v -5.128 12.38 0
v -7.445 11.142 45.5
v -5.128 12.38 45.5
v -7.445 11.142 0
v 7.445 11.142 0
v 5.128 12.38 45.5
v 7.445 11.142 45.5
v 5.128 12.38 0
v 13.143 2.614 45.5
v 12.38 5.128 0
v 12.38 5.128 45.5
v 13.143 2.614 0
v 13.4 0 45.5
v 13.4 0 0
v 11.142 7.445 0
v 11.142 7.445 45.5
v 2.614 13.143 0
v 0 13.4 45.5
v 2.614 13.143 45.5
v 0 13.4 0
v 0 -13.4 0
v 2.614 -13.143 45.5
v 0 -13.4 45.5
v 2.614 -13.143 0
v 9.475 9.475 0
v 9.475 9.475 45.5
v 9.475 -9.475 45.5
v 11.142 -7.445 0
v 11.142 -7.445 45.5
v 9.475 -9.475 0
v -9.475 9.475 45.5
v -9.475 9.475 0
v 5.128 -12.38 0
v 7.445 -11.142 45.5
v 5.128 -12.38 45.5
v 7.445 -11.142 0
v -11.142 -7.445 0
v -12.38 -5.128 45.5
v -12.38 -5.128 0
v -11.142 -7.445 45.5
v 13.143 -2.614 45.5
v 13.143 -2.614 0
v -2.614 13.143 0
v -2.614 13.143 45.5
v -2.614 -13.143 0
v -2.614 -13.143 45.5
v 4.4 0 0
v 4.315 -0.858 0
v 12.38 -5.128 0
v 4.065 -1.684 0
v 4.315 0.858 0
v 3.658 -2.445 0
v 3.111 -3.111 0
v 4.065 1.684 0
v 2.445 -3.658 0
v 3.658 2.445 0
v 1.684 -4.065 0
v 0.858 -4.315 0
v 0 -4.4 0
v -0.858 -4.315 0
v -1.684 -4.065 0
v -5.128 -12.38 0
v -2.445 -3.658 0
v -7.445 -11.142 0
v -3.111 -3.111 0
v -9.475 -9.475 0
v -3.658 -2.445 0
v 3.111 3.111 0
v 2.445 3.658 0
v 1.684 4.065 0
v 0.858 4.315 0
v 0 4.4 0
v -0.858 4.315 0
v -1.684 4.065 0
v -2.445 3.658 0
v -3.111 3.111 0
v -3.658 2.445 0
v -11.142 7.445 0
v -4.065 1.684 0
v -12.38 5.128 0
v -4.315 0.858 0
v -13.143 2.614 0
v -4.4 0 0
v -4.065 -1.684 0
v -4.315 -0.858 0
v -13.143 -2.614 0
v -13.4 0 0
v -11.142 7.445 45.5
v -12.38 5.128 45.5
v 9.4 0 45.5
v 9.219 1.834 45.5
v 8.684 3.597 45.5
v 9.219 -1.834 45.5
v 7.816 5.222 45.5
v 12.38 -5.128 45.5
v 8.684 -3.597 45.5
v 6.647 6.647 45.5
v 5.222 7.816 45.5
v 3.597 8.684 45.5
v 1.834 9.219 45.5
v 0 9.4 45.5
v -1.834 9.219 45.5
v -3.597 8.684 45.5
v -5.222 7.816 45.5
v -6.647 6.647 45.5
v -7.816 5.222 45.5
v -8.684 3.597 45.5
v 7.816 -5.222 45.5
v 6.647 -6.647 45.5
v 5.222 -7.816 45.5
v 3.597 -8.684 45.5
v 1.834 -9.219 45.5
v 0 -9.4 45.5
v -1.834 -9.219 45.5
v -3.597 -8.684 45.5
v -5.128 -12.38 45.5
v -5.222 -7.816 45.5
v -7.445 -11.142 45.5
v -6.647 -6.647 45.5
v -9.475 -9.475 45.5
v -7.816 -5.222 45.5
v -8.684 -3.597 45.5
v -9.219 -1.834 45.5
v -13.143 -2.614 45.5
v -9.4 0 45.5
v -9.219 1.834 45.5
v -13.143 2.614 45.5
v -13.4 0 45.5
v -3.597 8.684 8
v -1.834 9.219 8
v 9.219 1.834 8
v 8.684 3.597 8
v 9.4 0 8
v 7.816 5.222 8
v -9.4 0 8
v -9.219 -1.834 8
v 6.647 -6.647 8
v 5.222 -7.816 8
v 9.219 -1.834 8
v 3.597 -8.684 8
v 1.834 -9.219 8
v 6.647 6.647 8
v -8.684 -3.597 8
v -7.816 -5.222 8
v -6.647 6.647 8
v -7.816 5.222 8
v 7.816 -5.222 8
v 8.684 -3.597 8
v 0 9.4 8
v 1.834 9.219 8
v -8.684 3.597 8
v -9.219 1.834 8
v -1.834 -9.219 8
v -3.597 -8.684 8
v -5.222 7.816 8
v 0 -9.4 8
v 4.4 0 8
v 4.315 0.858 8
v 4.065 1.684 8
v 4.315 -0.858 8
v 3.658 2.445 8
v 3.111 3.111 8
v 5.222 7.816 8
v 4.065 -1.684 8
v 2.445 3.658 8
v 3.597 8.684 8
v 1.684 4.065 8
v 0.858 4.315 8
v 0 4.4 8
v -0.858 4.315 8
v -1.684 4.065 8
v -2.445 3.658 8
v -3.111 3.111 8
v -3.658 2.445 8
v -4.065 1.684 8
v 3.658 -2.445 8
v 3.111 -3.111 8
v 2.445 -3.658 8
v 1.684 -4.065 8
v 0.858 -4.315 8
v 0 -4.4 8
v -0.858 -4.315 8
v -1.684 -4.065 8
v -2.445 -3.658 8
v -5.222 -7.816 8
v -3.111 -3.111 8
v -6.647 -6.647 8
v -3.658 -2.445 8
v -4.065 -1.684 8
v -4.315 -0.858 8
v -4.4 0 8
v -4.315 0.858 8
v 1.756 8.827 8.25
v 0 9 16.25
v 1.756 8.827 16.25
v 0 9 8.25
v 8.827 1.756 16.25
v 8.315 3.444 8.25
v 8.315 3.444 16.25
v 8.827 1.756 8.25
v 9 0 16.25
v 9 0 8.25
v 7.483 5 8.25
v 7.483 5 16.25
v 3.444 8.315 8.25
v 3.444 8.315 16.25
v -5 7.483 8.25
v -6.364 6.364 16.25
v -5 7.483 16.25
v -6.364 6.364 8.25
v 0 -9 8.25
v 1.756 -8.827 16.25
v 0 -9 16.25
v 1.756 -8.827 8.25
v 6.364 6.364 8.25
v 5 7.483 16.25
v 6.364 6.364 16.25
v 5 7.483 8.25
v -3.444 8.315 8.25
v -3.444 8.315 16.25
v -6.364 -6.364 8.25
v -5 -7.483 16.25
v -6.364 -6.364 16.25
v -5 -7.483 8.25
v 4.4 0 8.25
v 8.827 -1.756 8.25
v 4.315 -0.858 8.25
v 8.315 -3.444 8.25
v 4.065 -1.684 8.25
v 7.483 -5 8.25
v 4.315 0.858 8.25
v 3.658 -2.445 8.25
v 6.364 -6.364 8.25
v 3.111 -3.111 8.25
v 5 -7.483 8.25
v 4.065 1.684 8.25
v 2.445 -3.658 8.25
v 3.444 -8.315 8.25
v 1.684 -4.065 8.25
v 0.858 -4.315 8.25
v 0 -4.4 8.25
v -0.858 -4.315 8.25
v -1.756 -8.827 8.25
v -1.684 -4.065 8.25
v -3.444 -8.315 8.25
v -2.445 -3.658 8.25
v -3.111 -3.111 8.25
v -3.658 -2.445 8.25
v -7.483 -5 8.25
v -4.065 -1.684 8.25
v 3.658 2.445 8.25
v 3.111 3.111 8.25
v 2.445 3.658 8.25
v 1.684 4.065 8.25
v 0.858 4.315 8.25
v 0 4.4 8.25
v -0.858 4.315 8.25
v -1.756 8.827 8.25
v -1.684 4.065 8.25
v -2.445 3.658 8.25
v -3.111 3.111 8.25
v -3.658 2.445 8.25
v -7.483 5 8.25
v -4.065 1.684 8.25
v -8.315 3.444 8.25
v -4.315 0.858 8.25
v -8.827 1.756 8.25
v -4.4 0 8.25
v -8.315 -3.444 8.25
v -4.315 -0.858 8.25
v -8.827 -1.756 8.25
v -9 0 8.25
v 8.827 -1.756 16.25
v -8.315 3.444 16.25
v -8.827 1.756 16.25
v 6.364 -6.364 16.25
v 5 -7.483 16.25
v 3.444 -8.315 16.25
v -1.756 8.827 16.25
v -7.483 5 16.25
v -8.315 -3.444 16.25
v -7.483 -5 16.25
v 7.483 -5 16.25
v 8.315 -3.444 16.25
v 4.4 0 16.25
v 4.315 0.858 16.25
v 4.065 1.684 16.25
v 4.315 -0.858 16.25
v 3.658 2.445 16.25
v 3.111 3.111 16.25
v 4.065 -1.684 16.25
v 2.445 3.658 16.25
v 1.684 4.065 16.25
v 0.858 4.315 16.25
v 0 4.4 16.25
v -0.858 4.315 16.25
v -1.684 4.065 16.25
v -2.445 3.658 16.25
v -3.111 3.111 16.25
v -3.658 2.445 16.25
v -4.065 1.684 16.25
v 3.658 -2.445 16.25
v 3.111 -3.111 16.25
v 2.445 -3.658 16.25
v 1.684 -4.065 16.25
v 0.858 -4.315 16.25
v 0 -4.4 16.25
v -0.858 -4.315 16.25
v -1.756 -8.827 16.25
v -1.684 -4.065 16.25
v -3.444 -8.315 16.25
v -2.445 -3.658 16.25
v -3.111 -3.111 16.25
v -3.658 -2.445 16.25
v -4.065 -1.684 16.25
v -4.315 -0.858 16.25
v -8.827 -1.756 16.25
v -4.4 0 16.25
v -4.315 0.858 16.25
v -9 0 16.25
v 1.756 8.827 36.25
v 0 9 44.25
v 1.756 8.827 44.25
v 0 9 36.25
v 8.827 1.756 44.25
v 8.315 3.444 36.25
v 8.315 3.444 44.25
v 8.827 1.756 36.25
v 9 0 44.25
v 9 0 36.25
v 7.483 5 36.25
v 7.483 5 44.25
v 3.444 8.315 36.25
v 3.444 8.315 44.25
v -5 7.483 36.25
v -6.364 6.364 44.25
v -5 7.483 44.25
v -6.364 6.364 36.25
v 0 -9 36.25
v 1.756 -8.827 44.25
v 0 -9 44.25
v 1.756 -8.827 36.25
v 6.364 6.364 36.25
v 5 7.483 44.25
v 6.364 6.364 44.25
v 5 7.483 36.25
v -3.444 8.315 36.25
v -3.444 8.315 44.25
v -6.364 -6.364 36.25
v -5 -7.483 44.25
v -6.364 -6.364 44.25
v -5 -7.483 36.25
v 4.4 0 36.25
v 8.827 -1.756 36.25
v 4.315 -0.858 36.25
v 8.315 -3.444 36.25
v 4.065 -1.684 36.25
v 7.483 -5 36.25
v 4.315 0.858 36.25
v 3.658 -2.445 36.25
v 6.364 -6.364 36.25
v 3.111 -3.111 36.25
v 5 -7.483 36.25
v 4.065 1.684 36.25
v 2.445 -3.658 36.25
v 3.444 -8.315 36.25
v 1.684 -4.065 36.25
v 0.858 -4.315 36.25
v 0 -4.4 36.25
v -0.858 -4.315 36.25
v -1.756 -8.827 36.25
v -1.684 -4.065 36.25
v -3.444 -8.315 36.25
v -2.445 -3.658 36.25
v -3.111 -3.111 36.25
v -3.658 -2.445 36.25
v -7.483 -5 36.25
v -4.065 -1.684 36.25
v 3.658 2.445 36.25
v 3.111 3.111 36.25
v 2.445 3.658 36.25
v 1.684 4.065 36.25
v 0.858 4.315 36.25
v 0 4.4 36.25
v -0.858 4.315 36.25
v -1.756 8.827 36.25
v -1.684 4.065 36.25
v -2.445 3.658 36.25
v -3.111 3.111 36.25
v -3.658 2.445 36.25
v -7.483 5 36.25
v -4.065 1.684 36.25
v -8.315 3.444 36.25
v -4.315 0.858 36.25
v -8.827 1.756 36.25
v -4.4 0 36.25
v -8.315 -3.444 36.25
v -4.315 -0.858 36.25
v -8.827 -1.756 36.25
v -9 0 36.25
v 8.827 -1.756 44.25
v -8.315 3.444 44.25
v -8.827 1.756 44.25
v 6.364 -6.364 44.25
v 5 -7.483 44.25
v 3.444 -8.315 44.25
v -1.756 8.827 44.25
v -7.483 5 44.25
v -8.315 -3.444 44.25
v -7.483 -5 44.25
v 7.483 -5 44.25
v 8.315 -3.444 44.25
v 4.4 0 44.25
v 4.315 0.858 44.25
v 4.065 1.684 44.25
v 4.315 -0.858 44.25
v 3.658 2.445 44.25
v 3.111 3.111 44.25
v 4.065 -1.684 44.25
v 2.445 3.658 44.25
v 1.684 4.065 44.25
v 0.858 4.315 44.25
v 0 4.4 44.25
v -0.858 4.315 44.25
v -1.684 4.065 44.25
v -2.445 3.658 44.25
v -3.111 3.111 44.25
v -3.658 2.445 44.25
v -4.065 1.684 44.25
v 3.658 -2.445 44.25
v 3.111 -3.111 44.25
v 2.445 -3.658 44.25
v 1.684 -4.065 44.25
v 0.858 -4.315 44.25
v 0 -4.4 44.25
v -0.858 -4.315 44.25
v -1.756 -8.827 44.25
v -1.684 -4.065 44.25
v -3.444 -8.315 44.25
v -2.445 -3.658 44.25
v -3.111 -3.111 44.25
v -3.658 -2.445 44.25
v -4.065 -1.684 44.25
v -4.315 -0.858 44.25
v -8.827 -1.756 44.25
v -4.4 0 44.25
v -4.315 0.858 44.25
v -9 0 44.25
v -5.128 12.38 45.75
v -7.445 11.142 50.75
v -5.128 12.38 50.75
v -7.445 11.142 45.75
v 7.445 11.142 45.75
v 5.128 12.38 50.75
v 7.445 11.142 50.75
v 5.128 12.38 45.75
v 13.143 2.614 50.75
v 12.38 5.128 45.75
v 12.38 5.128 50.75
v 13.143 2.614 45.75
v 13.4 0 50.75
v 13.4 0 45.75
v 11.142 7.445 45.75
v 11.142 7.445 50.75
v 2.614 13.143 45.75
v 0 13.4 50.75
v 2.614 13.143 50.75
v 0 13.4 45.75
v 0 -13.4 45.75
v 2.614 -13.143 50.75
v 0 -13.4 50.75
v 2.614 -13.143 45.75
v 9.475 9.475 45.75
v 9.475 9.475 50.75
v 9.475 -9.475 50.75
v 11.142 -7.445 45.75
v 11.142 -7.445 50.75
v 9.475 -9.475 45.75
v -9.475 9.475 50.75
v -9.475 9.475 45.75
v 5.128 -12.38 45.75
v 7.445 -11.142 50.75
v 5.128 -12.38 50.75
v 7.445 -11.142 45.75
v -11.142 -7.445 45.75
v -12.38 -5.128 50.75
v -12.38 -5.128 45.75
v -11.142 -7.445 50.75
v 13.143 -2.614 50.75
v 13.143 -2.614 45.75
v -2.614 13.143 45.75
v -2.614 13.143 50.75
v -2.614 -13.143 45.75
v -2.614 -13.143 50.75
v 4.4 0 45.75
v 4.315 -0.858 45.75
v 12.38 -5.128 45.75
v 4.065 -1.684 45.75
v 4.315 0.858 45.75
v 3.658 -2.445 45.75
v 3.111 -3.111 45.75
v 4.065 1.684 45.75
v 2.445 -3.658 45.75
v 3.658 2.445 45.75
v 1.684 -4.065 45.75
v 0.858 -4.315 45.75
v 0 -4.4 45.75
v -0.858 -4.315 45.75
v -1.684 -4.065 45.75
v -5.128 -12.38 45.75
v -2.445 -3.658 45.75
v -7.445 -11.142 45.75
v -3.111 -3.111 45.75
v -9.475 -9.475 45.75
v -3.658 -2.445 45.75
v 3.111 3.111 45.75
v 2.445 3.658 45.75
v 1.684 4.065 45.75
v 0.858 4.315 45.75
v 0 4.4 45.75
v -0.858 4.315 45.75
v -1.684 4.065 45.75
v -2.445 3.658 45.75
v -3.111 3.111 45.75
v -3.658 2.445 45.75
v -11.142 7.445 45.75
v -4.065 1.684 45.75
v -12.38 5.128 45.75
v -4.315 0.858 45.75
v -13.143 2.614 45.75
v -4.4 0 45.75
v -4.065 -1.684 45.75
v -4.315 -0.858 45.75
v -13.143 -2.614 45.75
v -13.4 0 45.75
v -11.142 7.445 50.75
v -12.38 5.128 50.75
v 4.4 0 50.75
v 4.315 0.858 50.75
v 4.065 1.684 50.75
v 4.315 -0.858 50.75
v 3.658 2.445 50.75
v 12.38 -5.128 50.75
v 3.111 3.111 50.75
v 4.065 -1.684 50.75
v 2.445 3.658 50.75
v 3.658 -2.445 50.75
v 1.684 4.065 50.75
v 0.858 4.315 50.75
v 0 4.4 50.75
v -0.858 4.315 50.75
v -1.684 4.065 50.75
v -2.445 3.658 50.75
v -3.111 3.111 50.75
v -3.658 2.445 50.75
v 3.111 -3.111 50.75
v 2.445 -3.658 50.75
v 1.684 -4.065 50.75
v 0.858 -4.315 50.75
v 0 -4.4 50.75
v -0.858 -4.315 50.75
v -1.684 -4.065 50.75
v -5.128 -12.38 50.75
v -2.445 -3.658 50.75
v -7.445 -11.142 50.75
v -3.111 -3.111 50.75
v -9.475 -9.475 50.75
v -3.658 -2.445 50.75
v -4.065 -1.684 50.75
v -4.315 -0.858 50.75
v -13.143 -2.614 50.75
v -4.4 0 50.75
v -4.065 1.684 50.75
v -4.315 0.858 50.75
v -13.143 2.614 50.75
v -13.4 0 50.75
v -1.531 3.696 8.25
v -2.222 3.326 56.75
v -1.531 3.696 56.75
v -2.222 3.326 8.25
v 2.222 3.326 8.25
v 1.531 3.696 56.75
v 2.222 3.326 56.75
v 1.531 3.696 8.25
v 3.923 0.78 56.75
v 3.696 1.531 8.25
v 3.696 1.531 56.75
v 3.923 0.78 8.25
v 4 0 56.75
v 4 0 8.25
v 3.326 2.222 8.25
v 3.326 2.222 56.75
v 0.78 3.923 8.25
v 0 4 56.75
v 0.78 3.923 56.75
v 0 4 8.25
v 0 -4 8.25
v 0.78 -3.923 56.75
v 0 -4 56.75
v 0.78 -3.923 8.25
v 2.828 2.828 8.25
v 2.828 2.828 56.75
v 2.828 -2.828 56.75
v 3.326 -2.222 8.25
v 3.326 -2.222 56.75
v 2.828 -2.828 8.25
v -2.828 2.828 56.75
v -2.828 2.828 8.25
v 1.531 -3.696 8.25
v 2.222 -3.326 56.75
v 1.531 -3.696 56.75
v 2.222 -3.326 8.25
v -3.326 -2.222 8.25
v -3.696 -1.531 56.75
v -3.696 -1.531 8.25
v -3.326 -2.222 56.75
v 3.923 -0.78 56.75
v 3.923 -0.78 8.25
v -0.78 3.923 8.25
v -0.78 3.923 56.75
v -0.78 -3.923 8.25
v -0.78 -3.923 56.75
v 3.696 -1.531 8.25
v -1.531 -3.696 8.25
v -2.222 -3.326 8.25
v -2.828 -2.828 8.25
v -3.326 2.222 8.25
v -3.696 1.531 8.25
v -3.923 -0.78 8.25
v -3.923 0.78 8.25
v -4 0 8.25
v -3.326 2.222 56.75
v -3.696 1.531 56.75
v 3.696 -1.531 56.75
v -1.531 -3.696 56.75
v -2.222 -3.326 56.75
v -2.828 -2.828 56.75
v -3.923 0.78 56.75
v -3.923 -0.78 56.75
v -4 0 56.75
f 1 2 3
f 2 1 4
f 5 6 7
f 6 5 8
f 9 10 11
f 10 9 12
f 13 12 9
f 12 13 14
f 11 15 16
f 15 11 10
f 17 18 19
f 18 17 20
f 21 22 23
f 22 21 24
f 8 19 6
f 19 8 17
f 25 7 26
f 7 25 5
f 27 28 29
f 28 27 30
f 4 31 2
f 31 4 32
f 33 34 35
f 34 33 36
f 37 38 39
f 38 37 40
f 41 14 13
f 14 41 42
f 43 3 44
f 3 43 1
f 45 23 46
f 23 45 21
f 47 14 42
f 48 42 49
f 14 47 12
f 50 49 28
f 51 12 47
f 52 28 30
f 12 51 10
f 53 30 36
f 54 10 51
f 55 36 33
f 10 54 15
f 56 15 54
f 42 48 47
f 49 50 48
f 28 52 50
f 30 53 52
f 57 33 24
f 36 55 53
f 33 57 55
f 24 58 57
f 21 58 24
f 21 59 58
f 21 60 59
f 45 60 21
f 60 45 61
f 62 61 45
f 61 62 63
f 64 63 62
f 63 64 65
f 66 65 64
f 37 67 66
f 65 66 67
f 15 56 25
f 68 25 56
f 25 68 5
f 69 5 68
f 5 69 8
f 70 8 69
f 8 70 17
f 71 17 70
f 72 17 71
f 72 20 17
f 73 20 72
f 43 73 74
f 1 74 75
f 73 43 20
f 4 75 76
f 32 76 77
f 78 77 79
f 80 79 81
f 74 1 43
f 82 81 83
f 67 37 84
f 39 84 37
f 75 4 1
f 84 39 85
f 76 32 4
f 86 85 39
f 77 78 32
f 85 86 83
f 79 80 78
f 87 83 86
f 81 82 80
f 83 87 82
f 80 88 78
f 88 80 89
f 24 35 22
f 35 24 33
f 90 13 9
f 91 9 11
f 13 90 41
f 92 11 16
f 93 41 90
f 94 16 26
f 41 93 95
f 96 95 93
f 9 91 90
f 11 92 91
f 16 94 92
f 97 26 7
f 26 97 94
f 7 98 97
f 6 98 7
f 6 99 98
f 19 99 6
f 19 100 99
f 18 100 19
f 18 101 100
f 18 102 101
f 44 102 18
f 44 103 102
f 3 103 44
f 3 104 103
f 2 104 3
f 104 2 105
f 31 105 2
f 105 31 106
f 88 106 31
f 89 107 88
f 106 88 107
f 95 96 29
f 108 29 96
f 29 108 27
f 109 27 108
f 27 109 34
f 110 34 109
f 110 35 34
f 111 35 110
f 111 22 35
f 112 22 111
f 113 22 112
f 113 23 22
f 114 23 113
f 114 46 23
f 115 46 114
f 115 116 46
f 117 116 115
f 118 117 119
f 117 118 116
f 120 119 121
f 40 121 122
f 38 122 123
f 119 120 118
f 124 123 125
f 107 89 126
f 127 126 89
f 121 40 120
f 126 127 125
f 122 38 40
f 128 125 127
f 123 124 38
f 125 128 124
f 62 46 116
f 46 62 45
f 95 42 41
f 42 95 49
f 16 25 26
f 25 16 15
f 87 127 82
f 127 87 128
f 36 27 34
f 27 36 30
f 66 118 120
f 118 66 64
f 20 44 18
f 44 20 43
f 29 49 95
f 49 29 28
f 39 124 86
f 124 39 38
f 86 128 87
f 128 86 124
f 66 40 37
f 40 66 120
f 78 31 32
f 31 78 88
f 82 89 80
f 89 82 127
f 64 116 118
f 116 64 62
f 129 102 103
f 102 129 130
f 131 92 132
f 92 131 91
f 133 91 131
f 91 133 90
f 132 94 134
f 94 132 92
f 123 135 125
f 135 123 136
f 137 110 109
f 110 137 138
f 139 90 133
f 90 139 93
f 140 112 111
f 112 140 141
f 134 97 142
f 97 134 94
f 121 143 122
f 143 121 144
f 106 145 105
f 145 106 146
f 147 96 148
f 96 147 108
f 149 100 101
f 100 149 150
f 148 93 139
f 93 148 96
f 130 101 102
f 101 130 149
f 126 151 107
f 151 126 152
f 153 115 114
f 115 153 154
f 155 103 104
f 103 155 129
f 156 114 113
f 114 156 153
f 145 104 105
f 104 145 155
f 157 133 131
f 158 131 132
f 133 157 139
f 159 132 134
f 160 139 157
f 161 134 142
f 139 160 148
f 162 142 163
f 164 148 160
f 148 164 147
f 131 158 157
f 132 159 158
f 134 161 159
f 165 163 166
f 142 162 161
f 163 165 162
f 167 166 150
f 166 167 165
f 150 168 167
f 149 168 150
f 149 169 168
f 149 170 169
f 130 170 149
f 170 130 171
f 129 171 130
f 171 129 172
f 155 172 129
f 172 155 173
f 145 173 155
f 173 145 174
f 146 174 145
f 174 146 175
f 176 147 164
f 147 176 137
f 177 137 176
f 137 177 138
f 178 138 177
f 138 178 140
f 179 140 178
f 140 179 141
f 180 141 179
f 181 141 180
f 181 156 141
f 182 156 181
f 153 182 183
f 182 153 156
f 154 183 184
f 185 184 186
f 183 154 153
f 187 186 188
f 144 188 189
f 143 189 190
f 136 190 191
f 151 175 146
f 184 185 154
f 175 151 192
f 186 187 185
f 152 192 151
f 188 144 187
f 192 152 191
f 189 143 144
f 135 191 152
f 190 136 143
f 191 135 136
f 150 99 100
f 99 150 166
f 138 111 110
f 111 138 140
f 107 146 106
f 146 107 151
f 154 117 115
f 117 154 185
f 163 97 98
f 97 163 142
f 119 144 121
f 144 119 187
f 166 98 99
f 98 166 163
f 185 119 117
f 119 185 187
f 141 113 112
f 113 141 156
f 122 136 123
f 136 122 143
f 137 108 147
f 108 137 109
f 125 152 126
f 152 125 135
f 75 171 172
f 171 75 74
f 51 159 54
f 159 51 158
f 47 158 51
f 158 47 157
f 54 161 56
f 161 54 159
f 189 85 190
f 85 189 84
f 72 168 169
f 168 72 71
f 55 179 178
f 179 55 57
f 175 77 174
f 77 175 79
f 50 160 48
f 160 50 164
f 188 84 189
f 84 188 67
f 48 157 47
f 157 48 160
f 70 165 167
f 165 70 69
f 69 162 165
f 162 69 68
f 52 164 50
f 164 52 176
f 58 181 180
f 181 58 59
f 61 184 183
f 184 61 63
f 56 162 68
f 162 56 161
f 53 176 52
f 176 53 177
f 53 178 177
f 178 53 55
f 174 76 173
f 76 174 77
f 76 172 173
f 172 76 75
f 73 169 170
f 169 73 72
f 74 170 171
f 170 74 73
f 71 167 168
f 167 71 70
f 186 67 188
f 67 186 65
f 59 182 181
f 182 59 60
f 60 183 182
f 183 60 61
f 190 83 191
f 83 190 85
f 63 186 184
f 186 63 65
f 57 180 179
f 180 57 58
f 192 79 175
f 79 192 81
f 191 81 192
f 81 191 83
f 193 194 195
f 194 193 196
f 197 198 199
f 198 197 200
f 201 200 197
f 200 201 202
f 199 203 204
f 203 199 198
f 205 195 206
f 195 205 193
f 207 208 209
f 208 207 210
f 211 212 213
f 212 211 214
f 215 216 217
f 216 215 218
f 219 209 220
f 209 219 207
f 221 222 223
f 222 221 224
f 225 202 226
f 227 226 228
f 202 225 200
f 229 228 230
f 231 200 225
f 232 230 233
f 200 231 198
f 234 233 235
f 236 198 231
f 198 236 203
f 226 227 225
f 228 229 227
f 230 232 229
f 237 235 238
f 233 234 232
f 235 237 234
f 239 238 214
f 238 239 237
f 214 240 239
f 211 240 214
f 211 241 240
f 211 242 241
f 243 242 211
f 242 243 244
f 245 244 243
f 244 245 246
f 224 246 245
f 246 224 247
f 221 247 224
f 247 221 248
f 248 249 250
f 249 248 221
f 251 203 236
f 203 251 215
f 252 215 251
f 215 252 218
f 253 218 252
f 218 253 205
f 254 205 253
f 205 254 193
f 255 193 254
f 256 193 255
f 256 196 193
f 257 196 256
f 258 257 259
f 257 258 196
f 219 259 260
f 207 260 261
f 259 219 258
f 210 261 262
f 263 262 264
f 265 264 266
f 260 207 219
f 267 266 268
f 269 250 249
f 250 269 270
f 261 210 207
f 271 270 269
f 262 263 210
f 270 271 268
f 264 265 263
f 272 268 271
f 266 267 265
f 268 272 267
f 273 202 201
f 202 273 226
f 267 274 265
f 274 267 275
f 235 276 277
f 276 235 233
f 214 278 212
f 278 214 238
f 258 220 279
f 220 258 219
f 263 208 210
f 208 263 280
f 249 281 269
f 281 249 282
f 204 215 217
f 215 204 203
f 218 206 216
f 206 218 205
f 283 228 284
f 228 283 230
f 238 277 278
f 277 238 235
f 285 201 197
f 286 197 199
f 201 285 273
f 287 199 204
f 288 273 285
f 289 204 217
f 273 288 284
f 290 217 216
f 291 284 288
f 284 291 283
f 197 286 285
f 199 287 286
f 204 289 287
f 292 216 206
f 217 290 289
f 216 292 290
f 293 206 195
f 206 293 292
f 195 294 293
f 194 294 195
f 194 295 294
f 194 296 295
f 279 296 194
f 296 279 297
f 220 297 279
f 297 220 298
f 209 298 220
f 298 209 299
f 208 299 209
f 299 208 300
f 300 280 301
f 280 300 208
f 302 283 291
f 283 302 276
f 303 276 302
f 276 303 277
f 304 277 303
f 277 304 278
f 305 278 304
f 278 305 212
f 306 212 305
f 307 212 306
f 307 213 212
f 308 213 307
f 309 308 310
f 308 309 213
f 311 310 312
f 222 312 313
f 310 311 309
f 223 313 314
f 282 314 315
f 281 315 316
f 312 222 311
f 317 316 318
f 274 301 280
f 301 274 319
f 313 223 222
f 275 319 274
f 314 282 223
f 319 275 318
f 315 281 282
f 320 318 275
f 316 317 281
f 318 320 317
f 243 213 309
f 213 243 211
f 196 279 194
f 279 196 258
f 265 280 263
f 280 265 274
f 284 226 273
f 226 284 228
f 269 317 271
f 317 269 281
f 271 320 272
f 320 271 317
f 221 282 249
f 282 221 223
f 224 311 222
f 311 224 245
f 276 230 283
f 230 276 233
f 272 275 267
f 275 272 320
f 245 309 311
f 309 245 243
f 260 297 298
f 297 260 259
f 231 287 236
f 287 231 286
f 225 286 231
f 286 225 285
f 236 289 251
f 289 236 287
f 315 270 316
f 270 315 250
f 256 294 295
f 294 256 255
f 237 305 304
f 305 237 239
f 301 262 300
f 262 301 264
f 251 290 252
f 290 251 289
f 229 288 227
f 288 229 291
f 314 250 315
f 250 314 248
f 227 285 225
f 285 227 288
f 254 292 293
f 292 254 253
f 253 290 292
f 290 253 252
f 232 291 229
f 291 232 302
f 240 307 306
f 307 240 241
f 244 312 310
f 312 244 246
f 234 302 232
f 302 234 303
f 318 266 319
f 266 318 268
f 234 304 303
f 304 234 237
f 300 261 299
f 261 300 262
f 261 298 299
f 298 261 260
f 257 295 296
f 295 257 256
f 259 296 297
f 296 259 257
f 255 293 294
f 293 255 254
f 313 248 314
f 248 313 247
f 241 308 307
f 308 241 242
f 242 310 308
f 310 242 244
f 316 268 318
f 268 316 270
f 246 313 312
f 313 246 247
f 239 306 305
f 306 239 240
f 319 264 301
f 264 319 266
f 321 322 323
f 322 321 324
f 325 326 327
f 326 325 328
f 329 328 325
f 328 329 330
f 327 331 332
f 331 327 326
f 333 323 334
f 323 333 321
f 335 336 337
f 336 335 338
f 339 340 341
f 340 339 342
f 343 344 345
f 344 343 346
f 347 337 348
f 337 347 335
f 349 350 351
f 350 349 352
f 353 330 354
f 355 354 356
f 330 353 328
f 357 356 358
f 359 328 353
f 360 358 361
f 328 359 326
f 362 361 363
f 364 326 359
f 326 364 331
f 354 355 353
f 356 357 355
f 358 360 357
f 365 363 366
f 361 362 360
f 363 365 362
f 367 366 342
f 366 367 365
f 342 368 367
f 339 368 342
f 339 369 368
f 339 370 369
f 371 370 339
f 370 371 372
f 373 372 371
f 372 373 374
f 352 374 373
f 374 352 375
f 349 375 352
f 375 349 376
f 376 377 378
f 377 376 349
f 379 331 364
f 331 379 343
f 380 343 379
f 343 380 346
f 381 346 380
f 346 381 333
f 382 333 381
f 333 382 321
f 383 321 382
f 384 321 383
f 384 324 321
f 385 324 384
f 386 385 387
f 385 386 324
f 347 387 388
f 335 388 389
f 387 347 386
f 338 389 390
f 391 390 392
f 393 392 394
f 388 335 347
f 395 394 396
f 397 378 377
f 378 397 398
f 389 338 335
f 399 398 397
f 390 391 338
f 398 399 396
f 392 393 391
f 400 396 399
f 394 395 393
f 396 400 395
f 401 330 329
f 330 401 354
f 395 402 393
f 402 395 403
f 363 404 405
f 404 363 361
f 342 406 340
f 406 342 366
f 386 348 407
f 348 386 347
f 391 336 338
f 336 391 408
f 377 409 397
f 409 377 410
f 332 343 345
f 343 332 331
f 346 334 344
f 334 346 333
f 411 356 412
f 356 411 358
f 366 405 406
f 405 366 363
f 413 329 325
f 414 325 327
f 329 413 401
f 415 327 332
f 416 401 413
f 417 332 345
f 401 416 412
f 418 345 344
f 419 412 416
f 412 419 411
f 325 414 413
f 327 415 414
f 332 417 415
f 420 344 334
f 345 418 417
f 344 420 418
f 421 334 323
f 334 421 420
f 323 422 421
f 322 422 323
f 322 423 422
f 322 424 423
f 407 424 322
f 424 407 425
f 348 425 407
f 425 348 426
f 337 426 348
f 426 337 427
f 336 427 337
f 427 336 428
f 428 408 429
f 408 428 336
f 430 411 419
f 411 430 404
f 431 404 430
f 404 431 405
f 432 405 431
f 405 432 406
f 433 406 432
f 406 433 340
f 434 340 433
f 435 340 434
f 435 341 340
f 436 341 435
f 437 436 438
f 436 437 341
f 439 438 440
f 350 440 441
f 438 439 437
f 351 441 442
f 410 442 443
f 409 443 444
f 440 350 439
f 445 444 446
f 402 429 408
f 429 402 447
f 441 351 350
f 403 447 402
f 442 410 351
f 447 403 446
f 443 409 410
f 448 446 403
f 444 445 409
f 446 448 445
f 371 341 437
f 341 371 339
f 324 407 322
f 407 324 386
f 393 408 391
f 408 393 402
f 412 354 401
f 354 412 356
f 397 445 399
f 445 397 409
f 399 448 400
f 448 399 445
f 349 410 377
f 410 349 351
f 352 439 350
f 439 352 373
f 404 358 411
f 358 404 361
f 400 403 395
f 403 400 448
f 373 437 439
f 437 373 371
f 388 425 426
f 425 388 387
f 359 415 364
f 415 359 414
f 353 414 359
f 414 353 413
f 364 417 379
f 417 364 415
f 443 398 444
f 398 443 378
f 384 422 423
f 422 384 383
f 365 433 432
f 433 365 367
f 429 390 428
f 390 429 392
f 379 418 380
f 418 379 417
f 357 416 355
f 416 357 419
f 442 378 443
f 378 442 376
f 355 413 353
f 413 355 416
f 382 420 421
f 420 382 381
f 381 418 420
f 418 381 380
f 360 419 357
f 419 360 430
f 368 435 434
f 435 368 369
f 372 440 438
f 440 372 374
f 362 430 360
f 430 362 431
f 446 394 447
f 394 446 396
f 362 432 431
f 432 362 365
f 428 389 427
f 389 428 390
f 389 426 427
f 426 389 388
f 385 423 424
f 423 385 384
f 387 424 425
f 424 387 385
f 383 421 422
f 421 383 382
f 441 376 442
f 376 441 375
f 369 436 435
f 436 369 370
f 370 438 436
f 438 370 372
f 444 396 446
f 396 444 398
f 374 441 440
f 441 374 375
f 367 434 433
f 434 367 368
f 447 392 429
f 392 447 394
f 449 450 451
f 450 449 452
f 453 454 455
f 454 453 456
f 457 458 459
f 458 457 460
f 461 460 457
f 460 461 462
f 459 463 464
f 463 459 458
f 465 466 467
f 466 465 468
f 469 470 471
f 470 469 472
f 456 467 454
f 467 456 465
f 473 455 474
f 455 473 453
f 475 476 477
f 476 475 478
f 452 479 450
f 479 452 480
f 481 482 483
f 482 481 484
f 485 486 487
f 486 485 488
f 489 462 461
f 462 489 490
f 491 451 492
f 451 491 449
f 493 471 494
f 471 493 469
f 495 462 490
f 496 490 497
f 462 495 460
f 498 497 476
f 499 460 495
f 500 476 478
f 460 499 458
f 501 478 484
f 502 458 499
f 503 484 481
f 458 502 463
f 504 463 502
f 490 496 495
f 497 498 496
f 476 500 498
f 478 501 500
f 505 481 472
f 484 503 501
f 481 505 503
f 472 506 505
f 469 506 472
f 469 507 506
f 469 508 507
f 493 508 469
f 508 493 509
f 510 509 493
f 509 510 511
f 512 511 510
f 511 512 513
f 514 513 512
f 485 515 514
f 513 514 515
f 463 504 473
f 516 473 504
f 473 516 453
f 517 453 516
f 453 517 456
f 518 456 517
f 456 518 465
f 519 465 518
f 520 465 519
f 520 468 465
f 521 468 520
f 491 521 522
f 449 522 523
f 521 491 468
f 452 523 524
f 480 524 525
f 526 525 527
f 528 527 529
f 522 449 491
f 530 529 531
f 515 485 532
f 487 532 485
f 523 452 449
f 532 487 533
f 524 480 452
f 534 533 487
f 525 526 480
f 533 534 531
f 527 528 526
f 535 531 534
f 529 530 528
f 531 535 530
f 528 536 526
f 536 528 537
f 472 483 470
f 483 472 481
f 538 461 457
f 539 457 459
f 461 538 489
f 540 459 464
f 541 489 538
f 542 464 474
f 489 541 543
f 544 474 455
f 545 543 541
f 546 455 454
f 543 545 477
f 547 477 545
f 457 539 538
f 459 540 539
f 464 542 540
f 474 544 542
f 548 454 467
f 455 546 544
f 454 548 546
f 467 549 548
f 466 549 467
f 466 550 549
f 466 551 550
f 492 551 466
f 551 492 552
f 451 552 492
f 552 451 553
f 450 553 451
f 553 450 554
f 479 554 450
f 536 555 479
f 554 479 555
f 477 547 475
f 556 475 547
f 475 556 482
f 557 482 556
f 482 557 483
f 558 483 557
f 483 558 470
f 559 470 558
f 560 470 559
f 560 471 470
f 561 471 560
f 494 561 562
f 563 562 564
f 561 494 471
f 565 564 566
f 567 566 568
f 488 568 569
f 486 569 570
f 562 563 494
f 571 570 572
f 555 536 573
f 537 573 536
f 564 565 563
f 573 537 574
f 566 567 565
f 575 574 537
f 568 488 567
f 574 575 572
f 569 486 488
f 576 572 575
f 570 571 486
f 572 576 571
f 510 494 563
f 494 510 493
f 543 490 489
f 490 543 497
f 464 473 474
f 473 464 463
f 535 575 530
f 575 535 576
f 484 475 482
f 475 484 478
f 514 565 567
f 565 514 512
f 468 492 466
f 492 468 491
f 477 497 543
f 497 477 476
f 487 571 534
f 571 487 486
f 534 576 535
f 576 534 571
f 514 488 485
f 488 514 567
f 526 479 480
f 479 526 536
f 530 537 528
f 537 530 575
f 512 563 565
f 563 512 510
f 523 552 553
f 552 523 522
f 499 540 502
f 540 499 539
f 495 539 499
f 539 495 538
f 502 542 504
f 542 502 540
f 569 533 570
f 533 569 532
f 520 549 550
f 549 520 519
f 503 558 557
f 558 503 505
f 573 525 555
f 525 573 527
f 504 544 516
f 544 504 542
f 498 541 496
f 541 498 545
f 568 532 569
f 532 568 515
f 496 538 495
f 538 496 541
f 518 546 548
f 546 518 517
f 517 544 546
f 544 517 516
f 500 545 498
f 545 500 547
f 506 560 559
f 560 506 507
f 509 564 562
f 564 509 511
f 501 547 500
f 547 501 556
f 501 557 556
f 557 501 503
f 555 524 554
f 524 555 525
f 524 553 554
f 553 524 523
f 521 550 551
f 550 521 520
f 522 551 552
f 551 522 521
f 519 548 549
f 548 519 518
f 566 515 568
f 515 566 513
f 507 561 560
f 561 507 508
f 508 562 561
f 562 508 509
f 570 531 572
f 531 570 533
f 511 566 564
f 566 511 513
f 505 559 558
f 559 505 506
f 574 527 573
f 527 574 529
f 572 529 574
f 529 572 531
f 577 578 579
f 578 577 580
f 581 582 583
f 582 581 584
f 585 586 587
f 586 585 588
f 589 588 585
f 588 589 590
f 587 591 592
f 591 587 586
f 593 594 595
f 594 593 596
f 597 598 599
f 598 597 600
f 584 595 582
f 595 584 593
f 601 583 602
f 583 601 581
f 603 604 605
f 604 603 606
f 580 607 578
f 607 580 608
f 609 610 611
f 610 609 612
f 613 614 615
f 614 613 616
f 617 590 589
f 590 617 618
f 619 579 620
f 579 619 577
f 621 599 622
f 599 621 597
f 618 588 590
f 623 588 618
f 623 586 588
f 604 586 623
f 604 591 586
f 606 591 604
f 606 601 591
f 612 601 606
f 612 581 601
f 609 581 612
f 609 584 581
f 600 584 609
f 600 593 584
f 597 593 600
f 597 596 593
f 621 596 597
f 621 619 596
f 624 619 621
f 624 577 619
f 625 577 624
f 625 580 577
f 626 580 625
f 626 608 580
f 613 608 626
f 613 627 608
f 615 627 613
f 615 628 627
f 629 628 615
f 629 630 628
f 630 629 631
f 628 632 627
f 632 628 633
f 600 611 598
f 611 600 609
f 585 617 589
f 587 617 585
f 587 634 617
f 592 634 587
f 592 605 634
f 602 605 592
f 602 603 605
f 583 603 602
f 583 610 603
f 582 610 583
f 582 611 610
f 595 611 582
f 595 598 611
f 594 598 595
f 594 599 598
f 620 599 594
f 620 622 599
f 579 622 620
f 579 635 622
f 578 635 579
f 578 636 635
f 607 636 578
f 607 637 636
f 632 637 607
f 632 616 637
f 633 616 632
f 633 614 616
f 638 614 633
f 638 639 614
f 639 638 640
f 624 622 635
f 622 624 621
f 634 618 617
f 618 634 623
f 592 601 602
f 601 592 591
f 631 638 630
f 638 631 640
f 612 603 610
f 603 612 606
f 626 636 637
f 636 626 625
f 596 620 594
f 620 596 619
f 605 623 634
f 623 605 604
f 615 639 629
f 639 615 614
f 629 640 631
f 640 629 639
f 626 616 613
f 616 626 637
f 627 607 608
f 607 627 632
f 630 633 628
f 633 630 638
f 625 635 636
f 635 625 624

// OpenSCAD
$fn = 32;

// ------------------------------------------------------------------------
// Shaft station: cup d26.8 x 45.5 mm, shaft d8
// Every part is its own module, assembly() places every instance.
// ------------------------------------------------------------------------

// --- part 1 ---
module housing_cup() {
  difference() {
    cylinder(h = 45.5, d = 26.8);
    translate([0, 0, 8]) cylinder(h = 38.5, d = 18.8);
    translate([0, 0, -1]) cylinder(h = 10, d = 8.8);
  }
}

// --- part 2 ---
module bearing_lower() {
  difference() {
      translate([0, 0, 0]) cylinder(h = 8, d = 18);
      translate([0, 0, -1]) cylinder(h = 10, d = 8.8);
    }
}

// --- part 3 ---
module bearing_upper() {
  difference() {
      translate([0, 0, 0]) cylinder(h = 8, d = 18);
      translate([0, 0, -1]) cylinder(h = 10, d = 8.8);
    }
}

// --- part 4 ---
module station_shaft() {
  translate([0, 0, -24.25]) cylinder(h = 48.5, d = 8);
}

// --- part 5 ---
module station_cover() {
  difference() {
    cylinder(h = 5, d = 26.8);
    translate([0, 0, -1]) cylinder(h = 7, d = 8.8);
  }
}

// --- assembly ---
module assembly() {
  color([0.80, 0.24, 0.20]) translate([0, 0, 0]) rotate([0, 0, 0]) housing_cup();
  color([0.20, 0.45, 0.75]) translate([0, 0, 8.25]) rotate([0, 0, 0]) bearing_lower();
  color([0.25, 0.62, 0.32]) translate([0, 0, 36.25]) rotate([0, 0, 0]) bearing_upper();
  color([0.92, 0.70, 0.18]) translate([0, 0, 32.5]) rotate([0, 0, 0]) station_shaft();
  color([0.58, 0.35, 0.70]) translate([0, 0, 45.75]) rotate([0, 0, 0]) station_cover();
}

assembly();
